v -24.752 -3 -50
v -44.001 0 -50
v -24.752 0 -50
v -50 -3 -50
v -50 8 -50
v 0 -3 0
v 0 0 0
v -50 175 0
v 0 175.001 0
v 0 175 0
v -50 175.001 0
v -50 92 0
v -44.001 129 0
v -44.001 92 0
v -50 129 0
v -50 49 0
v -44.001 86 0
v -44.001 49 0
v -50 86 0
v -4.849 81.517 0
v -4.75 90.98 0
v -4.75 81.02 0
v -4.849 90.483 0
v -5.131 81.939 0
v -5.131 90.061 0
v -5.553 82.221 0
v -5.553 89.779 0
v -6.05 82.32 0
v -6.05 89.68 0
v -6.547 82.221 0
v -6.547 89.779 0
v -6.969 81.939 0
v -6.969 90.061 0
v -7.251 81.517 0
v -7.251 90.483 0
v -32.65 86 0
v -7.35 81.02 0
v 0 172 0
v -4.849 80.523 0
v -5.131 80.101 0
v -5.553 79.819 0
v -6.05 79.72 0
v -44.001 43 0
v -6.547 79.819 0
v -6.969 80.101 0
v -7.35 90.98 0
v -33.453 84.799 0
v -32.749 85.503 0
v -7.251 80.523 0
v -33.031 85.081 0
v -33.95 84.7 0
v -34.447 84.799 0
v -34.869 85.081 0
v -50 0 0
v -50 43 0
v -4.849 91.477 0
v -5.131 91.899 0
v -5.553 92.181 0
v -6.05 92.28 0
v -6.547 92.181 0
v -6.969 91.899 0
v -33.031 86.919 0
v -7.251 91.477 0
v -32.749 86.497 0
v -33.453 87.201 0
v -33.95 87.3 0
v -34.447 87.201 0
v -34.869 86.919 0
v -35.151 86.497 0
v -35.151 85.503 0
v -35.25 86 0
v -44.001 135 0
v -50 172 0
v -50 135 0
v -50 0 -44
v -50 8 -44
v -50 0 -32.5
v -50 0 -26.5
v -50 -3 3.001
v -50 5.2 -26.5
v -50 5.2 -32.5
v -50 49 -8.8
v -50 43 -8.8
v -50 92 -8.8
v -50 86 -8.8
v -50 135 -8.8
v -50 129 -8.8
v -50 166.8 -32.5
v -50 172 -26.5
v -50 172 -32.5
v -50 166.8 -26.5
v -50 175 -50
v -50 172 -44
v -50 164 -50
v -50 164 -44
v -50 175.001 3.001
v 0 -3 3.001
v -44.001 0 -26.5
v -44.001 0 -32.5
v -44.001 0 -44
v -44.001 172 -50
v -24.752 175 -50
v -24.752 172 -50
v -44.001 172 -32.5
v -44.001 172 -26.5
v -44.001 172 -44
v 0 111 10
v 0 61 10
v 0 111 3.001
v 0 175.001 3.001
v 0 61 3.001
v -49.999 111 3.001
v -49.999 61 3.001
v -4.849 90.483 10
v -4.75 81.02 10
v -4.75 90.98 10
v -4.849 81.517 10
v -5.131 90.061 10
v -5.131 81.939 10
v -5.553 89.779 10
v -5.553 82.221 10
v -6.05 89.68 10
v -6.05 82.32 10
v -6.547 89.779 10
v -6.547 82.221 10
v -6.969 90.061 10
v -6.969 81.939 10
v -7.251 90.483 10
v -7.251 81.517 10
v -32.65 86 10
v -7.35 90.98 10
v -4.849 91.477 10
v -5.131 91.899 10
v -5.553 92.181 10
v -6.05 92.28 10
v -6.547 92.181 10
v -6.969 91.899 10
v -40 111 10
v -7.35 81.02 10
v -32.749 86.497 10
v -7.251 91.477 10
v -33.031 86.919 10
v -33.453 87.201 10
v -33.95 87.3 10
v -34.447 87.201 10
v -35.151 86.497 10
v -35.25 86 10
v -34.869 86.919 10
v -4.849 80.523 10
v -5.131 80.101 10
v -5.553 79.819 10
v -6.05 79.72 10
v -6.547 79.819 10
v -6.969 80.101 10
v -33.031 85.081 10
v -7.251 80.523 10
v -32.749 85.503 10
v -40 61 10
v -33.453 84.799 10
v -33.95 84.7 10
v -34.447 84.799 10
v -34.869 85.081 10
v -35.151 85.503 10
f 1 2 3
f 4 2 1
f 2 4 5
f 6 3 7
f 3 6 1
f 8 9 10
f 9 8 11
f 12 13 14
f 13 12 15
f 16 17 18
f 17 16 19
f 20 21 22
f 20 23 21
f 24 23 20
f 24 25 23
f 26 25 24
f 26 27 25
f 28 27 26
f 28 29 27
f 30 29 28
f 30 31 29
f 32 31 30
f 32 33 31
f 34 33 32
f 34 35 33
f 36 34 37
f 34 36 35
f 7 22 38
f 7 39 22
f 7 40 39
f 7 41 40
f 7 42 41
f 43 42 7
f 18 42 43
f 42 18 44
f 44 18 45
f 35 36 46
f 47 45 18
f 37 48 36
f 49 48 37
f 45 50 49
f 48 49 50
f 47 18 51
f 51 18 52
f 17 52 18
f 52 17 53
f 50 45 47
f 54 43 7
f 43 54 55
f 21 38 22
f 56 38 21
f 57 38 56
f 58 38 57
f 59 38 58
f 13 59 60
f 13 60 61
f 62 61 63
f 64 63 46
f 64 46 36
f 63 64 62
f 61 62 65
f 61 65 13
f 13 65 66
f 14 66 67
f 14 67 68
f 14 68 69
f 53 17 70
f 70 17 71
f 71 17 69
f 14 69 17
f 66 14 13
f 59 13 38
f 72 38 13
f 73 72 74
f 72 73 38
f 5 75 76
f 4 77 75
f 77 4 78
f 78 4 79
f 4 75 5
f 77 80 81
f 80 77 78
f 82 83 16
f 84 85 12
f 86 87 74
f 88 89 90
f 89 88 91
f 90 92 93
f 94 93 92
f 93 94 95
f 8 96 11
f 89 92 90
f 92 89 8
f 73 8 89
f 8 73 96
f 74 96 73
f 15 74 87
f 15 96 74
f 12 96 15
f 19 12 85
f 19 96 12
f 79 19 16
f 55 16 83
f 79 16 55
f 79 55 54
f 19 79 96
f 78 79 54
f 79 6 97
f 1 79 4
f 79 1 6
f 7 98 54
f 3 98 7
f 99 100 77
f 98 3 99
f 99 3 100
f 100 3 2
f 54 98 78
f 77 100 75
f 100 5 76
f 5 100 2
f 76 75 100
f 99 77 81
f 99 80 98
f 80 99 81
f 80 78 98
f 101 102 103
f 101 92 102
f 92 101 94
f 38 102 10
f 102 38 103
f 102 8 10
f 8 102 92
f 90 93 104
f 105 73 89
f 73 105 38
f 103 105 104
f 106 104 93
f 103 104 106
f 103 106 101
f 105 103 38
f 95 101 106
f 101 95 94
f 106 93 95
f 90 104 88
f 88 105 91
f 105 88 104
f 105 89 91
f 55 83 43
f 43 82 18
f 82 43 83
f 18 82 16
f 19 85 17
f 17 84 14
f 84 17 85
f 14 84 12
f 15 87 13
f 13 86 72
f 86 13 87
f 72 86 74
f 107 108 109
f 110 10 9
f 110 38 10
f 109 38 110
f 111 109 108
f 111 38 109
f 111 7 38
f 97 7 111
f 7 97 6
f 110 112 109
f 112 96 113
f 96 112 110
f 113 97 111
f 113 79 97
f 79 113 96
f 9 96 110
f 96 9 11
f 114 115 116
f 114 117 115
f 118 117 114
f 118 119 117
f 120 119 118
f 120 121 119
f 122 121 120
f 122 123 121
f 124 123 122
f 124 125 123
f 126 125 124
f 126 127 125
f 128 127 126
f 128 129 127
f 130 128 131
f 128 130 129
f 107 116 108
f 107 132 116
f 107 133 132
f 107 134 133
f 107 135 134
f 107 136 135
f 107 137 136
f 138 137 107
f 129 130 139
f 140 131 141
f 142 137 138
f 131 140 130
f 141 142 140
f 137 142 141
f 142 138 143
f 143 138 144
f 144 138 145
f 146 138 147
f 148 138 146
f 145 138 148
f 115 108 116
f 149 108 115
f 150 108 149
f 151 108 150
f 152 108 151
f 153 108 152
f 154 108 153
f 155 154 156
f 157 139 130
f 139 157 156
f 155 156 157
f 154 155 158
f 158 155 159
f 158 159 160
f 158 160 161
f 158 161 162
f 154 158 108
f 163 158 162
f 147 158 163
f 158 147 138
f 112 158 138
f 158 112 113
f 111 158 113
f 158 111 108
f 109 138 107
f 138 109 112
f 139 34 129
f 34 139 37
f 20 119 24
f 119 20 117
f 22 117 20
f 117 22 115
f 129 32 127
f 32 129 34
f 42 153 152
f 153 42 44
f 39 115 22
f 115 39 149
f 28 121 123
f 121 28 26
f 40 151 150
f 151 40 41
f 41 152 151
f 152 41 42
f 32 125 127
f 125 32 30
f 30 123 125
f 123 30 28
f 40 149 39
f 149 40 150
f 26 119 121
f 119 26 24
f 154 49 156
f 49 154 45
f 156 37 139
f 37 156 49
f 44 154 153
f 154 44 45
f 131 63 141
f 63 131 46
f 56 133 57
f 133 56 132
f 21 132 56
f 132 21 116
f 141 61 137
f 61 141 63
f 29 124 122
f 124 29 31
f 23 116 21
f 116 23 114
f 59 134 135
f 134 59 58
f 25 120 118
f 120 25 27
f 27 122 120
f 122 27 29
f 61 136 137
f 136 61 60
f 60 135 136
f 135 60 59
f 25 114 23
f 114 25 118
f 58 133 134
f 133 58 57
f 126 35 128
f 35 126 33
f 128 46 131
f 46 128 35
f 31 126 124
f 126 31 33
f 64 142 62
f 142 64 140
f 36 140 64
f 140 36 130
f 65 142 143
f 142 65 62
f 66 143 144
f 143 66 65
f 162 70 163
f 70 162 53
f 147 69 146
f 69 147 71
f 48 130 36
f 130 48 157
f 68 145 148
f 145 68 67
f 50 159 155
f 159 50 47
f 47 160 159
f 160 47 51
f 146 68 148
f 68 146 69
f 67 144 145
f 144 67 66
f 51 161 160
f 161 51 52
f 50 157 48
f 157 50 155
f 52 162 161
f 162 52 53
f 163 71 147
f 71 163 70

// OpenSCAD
use <tubemesh.scad>;

boatWidth = 172;
attachmentBlockHeight = 10;
attachmentBlockWidth = 50;
attachmentBlockLength = 40;
sideStrapHeight = 50;
rearSlope = 2.02;
strapThickness = 3;

screwHoleSize = 2.6;
screwSpacingY = 9.96;
screwSpacingX = 27.9;
spikeThickness = 6;
spikeLength = 8;

module dummy() {}

nudge = 0.001;

topLength = attachmentBlockLength+attachmentBlockHeight;

module straps() {
    module spike(l) {
       morphExtrude([[0,-nudge,0],[spikeThickness,-nudge,0],[spikeThickness,-nudge,spikeThickness],[0,-nudge,spikeThickness]], [[0,l,0],[0,l,spikeThickness]], numSlices=1);
         }
    module sideStrap() {
        bottomLength = topLength - sideStrapHeight / rearSlope;
        prism(base=[[-topLength,0,-sideStrapHeight],[-sideStrapHeight/rearSlope,0,-sideStrapHeight],[0,0,0],[-topLength,0,0]],vertical=[0,strapThickness,0]);
        translate([-topLength,strapThickness,-sideStrapHeight]) spike(spikeLength);
        translate([-topLength,strapThickness,-sideStrapHeight*0.65]) spike(spikeLength*0.65);
    }
    sideStrap();
    translate([0,boatWidth+2*strapThickness,0]) mirror([0,1,0]) sideStrap();
    translate([-topLength,0,0])
    cube([topLength,boatWidth+2*strapThickness+nudge,nudge+strapThickness]);
    translate([-topLength,strapThickness,0])
        for(t=[1/4,1/2,3/4]) translate([0,t*boatWidth,0]) rotate([-90,0,0]) spike(spikeLength*1.1);
}

module attachmentBlock() {
    prism(base=[[-topLength,0,strapThickness],[0,0,strapThickness],[0,0,attachmentBlockHeight],[-attachmentBlockLength,0,attachmentBlockHeight]], vertical=[0,attachmentBlockWidth,0]);
}

module mainBody() {
    translate([0,-strapThickness,0]) {
        straps();
        translate([0,boatWidth/2+strapThickness-attachmentBlockWidth/2,0])
        attachmentBlock();
    }
}

module screwHole() {
    translate([0,0,-nudge])
    cylinder(d=screwHoleSize,h=attachmentBlockHeight+2*nudge,$fn=16);
}

module screwHoles() {
    screwRearX = screwSpacingX/2-attachmentBlockLength/2;
    screwPositions = [ [screwRearX,-screwSpacingY/2,0], [screwRearX,screwSpacingY/2,0], [screwRearX-screwSpacingX,0,0]];
    translate([0,boatWidth/2,0])
    for (v=screwPositions) translate(v) screwHole();
}

module main() {
    render(convexity=3)
    difference() {
        mainBody();
        screwHoles();
    }
}

//rotate([0,-90,0])
main();
